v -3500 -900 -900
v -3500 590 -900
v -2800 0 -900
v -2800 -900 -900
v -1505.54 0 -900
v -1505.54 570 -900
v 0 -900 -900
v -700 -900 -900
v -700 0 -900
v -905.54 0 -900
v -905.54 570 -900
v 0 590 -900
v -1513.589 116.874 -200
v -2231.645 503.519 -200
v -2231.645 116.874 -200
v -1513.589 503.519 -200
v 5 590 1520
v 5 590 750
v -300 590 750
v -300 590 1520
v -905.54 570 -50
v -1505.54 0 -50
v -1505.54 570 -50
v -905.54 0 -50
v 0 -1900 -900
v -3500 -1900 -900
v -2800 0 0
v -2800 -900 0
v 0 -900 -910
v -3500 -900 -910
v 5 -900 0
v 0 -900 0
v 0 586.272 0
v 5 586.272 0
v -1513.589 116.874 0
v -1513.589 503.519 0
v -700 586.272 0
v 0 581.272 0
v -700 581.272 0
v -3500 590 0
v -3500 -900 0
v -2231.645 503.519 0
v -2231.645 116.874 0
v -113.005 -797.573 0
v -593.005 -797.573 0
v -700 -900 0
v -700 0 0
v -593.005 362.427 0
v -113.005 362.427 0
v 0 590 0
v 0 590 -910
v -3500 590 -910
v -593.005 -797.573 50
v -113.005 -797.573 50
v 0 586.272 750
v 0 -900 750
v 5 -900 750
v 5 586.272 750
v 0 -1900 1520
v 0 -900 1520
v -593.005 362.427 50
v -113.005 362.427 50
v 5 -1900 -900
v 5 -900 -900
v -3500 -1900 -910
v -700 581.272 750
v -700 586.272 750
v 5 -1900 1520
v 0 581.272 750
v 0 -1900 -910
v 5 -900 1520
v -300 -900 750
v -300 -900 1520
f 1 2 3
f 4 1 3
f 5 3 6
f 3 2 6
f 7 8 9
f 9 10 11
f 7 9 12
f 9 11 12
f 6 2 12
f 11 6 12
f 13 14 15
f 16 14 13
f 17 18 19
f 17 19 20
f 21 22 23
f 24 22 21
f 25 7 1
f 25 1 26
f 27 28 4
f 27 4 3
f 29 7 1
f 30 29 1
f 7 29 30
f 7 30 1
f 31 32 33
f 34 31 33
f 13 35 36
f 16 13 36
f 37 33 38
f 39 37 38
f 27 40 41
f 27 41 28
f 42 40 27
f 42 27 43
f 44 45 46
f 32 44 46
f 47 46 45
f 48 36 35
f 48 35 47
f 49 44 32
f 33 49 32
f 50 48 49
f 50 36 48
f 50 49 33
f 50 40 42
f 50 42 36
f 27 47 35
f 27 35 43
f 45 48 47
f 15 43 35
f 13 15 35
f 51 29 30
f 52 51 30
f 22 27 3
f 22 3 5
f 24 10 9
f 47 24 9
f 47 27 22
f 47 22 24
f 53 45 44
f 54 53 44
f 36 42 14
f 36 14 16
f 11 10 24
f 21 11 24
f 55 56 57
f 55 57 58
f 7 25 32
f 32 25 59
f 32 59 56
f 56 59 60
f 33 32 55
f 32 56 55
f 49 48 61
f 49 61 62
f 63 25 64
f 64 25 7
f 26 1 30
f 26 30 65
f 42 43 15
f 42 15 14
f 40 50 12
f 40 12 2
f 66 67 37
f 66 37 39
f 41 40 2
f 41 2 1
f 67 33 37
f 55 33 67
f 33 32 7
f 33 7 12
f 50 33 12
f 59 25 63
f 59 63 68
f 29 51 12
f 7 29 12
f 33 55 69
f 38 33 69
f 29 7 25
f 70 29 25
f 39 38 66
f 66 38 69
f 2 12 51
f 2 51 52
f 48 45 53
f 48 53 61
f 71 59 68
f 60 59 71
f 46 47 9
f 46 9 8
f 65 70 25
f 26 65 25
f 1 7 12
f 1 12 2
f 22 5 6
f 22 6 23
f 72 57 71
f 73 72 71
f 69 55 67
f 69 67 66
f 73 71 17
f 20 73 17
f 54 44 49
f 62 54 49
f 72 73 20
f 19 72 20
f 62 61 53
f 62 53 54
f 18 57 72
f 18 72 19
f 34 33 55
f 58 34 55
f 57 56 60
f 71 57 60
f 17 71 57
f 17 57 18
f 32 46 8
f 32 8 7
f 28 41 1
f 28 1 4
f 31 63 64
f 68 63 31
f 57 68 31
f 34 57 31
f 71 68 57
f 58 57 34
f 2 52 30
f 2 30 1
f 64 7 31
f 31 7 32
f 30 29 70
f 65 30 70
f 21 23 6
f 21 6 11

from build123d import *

# Parameters (mm, degrees)
F1_DEPTH   = 900
F2_W       = 718.055725
F2_H       = 386.645332
F3_DEPTH   = 200
F2_W_2     = 480
F2_H_2     = 1160
F4_DEPTH   = 50
F5_W       = 600
F5_H       = 850
F6_DEPTH   = 570
F7_W       = 1490
F7_H       = 750
F8_DEPTH   = 5
F9_W       = 5
F9_H       = 750
F10_DEPTH  = 700
F11_W      = 1000
F11_H      = 2420
F12_DEPTH  = 5
F13_W      = 1000
F13_H      = 10
F14_DEPTH  = 3500
F14_FACE_W = 3500
F14_FACE_H = 10
F15_DEPTH  = 1490
F16_W      = 1490
F16_H      = 770
F17_DEPTH  = 305


with BuildPart() as f1:
    # F0 (on Top) → F1 (new body)
    with BuildSketch(Plane.XY):
        Polygon((0, 0), (0, 590), (-3500, 590), (-3500, 0), (-3500, -900), (-2800, -900), (-2800, 0), (-700, 0), (-700, -900), (0, -900), align=None)
    extrude(amount=-F1_DEPTH)

    # F2 (on face) → F3 (cut)
    with BuildSketch(Plane.XY):
        with Locations((-1872.617244, 310.196631)):
            Rectangle(F2_W, F2_H)
    extrude(amount=-F3_DEPTH, mode=Mode.SUBTRACT)

    # F2 (on face) → F4 (join)
    with BuildSketch(Plane.XY):
        with Locations((-353.00524, -217.57303)):
            Rectangle(F2_W_2, F2_H_2)
    extrude(amount=F4_DEPTH)

    # F5 (on face) → F6 (cut)
    with BuildSketch(Plane.XZ):
        with Locations((-1205.54049, -475)):
            Rectangle(F5_W, F5_H)
    extrude(amount=-F6_DEPTH, mode=Mode.SUBTRACT)



with BuildPart() as f8:
    # F7 (on Right) → F8 (new body)
    with BuildSketch(Plane.YZ):
        with Locations((-158.727651, 375)):
            Rectangle(F7_W, F7_H)
    extrude(amount=F8_DEPTH)


with BuildPart() as f10:
    # F9 (on face) → F10 (new body)
    with BuildSketch(Plane(origin=(0, 0, 0), x_dir=(0, -1, 0), z_dir=(-1, 0, 0))):
        with Locations((-583.772349, 375)):
            Rectangle(F9_W, F9_H)
    extrude(amount=F10_DEPTH)


with BuildPart() as f1_1:
    add(f1.part)

    add(f8.part)  # F12 merges F8
    # F11 (on face) → F12 (join)
    with BuildSketch(Plane.YZ):
        with Locations((-1400, 310)):
            Rectangle(F11_W, F11_H)
    extrude(amount=F12_DEPTH)


with BuildPart() as f14:
    # F13 (on face) → F14 (new body)
    with BuildSketch(Plane(origin=(0, 0, 0), x_dir=(0, -1, 0), z_dir=(-1, 0, 0))):
        with Locations((1400, -905)):
            Rectangle(F13_W, F13_H)
    extrude(amount=F14_DEPTH)


with BuildPart() as f15:
    # F14_face (on face) → F15 (new body)
    with BuildSketch(Plane(origin=(-1750, -900, -905), x_dir=(-1, 0, 0), z_dir=(0, 1, 0))):
        Rectangle(F14_FACE_W, F14_FACE_H)
    extrude(amount=F15_DEPTH)


with BuildPart() as f17:
    # F16 (on face) → F17 (new body)
    with BuildSketch(Plane.YZ.offset(5)):
        with Locations((-155, 1135)):
            Rectangle(F16_W, F16_H)
    extrude(amount=-F17_DEPTH)


solid = Compound([f10.part, f1_1.part, f14.part, f15.part, f17.part])
